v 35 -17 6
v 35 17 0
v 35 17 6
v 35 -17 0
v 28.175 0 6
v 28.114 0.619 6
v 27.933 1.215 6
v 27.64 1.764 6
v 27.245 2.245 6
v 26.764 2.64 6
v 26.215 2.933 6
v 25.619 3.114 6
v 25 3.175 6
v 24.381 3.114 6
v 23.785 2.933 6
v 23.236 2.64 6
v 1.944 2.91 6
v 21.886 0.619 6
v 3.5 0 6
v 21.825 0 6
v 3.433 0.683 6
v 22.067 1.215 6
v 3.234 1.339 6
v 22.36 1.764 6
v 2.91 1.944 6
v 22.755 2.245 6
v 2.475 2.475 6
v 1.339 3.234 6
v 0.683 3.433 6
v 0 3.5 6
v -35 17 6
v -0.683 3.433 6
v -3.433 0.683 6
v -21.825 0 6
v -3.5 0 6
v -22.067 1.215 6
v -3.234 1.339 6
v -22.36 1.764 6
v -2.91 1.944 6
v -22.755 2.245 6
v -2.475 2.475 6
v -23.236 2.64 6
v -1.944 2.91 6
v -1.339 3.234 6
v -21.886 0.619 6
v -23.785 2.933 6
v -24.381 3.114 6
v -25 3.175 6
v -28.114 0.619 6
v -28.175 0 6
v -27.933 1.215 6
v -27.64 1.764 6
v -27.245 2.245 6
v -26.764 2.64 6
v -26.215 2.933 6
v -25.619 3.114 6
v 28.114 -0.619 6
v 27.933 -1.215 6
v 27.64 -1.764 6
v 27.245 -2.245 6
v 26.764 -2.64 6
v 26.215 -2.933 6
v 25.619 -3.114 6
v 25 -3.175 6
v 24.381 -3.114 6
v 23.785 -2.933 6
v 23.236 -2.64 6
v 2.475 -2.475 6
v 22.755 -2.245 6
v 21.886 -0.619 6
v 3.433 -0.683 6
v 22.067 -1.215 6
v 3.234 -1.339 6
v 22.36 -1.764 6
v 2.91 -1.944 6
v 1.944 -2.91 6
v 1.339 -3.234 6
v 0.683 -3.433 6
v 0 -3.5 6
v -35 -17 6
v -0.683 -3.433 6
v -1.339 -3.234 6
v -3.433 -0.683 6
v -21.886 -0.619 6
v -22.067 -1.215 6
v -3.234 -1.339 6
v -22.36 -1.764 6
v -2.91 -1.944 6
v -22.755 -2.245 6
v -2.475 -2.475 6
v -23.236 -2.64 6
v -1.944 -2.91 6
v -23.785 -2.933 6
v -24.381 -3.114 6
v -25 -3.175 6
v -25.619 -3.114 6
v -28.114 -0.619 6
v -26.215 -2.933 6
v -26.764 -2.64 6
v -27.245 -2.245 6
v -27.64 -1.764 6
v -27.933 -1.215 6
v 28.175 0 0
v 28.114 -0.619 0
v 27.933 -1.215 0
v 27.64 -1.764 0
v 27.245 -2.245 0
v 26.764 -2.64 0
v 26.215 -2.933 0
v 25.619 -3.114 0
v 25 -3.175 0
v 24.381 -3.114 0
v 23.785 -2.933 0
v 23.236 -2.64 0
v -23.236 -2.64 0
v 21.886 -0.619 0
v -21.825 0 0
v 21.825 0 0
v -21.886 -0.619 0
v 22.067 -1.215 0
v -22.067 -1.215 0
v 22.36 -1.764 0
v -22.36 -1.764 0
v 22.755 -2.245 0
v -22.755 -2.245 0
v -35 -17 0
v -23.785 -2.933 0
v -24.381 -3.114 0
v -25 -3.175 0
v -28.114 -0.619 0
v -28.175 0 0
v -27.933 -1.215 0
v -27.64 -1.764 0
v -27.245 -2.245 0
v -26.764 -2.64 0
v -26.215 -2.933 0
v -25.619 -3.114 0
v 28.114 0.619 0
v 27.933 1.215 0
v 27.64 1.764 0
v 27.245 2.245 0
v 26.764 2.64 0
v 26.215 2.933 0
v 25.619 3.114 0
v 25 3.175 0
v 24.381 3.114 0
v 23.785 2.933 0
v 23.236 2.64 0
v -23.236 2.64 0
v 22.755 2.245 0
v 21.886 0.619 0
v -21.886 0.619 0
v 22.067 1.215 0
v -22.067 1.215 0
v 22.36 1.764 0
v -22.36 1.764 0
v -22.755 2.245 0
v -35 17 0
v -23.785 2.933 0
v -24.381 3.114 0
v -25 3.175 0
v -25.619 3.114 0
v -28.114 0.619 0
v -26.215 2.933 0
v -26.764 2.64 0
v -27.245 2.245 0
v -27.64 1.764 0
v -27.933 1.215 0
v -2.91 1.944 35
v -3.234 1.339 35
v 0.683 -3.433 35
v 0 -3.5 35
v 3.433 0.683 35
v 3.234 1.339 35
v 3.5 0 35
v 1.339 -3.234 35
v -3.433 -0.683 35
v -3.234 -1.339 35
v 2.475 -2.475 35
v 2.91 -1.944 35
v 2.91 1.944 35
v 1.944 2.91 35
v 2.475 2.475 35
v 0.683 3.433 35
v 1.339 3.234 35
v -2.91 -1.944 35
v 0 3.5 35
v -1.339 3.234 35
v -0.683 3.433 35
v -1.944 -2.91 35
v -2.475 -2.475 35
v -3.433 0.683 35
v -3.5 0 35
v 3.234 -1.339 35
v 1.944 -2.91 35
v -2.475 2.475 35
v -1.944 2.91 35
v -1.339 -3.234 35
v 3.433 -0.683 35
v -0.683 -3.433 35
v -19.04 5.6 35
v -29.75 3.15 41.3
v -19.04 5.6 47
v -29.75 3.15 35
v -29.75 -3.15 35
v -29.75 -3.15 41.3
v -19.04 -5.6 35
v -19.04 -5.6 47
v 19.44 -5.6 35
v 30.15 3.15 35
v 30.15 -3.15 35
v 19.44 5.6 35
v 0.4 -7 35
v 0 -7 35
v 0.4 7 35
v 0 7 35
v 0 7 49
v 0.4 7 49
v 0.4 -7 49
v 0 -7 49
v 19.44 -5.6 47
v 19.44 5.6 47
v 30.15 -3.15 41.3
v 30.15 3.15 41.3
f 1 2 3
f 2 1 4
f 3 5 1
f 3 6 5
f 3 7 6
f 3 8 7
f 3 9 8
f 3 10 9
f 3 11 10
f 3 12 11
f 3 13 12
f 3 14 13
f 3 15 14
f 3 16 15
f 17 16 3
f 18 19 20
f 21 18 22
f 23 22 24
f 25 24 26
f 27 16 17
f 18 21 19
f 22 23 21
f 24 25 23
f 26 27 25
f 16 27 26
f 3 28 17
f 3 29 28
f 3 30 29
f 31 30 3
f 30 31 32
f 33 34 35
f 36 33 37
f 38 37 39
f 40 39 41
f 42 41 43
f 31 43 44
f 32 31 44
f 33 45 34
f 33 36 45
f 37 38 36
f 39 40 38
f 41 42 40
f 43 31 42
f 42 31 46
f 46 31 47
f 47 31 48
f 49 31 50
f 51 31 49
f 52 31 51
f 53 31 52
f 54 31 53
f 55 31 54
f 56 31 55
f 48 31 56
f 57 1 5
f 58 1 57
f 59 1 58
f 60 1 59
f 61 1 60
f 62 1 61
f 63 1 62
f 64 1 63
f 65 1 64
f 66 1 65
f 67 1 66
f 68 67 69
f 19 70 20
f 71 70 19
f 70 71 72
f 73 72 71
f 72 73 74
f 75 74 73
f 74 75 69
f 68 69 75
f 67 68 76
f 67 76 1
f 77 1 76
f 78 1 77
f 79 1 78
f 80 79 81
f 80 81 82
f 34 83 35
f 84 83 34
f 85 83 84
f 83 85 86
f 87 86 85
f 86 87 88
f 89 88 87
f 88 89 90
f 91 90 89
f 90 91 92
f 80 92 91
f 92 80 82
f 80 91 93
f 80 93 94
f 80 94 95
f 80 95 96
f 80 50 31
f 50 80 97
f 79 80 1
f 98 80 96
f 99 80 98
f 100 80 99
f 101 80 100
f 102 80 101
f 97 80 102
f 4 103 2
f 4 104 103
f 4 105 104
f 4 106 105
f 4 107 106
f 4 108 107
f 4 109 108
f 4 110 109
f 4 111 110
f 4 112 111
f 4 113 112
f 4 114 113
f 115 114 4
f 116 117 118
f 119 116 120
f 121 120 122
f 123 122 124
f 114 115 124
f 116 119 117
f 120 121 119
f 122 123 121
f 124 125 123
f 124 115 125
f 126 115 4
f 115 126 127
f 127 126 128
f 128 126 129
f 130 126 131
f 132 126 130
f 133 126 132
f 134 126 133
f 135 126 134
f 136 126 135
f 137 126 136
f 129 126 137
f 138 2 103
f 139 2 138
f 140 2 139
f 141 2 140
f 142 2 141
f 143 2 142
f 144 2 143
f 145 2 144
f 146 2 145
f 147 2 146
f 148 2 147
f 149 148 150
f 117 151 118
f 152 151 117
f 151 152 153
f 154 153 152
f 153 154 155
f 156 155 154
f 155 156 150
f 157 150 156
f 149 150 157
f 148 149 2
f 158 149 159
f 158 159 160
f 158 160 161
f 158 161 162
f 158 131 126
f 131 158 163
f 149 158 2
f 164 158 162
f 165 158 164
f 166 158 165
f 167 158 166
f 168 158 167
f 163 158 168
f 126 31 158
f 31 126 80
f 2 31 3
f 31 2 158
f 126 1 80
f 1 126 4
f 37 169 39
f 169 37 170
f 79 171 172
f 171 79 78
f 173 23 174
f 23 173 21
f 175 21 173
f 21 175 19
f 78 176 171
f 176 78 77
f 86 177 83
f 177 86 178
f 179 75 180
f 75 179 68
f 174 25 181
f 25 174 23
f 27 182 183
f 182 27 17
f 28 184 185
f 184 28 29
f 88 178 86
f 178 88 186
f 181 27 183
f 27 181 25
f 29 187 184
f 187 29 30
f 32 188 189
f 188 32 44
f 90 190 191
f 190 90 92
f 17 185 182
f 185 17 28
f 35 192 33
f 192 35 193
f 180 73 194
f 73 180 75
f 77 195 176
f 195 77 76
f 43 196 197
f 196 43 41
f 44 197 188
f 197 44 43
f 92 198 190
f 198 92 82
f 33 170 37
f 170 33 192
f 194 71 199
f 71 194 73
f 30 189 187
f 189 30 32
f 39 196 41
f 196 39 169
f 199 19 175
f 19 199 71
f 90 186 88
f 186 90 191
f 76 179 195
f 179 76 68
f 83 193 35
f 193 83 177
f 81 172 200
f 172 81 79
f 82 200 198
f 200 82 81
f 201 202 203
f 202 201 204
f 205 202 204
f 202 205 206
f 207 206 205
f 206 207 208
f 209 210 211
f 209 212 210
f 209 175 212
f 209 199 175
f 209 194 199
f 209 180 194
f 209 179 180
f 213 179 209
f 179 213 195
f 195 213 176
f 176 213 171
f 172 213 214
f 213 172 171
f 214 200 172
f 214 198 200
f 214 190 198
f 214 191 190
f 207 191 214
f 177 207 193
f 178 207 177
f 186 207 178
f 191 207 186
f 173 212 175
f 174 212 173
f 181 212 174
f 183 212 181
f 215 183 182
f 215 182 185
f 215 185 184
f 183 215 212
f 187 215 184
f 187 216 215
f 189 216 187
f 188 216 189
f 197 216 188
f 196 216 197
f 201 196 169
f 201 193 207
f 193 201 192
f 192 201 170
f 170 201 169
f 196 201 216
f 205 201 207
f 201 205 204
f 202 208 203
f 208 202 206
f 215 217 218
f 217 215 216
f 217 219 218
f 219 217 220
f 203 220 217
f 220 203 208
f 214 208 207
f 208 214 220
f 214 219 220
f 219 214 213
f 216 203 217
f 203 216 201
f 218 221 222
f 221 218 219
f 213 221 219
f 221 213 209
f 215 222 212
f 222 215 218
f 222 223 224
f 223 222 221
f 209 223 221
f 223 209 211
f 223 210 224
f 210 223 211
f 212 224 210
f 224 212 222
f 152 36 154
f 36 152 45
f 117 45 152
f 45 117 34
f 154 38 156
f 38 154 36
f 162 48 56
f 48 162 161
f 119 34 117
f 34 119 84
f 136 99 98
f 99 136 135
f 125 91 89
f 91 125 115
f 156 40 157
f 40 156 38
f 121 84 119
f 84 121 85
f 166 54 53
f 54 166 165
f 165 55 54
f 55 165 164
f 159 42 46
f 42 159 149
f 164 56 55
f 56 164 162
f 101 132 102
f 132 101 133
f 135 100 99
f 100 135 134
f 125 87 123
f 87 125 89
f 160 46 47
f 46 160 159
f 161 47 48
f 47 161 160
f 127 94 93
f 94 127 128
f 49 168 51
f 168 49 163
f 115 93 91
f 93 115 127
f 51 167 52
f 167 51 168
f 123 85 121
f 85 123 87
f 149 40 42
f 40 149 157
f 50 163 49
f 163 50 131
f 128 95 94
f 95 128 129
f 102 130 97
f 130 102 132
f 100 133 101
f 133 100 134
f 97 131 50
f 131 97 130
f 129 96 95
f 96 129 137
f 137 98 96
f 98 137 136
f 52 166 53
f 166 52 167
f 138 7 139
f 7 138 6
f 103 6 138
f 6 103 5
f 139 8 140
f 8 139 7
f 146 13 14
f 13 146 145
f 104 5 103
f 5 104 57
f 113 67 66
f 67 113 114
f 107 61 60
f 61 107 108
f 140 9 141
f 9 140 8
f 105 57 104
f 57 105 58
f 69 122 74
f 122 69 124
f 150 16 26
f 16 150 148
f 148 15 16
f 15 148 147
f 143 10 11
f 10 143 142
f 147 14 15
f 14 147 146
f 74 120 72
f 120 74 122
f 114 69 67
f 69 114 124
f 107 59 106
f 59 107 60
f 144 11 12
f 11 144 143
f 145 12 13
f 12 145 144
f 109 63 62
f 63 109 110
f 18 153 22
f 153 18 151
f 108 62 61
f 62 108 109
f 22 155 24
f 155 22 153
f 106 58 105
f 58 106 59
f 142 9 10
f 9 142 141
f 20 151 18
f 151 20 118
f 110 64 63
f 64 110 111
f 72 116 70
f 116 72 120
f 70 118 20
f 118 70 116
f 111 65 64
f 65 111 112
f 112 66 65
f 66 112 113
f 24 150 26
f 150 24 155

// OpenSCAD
$fn = 32;

// ----------------------------------------------------------------------
// Boat cleat: 70 mm base, horn 42 mm up
// ----------------------------------------------------------------------

// --- parameters (mm) ---
base_l = 70;              // base length
base_w = 34;              // base width
base_t = 6;               // base thickness
horn_len = 59.5;          // horn length
horn_d = 14;              // horn diameter at the middle
horn_z = 42;              // horn axis height
end_drop = 8;             // how far the horn tips drop
post_d = 7;               // centre post diameter
holes_d = 6.35;           // fixing holes
hole_x = 25;              // fixing hole spacing

difference() {
  union() {
    translate([-35, -17, 0]) cube([base_l, base_w, base_t]);
    /* centre post, sunk 1 mm into the base */
    translate([0, 0, 5]) cylinder(h = 37, d = post_d);
    /* horn: a hull chain of boxes, full in the middle and lighter at the tips */
    hull() {
      translate([-29.75, -3.15, 35]) cube([0.4, 6.3, 6.3], center = false);
      translate([-19.04, -5.6, 35]) cube([0.4, 11.2, 12], center = false);
    }
    hull() {
      translate([-19.04, -5.6, 35]) cube([0.4, 11.2, 12], center = false);
      translate([0, -7, 35]) cube([0.4, 14, 14], center = false);
    }
    hull() {
      translate([0, -7, 35]) cube([0.4, 14, 14], center = false);
      translate([19.04, -5.6, 35]) cube([0.4, 11.2, 12], center = false);
    }
    hull() {
      translate([19.04, -5.6, 35]) cube([0.4, 11.2, 12], center = false);
      translate([29.75, -3.15, 35]) cube([0.4, 6.3, 6.3], center = false);
    }
  }
  translate([-25, 0, -2.5]) cylinder(h = base_t + 5, d = holes_d);
  translate([25, 0, -2.5]) cylinder(h = base_t + 5, d = holes_d);
}
